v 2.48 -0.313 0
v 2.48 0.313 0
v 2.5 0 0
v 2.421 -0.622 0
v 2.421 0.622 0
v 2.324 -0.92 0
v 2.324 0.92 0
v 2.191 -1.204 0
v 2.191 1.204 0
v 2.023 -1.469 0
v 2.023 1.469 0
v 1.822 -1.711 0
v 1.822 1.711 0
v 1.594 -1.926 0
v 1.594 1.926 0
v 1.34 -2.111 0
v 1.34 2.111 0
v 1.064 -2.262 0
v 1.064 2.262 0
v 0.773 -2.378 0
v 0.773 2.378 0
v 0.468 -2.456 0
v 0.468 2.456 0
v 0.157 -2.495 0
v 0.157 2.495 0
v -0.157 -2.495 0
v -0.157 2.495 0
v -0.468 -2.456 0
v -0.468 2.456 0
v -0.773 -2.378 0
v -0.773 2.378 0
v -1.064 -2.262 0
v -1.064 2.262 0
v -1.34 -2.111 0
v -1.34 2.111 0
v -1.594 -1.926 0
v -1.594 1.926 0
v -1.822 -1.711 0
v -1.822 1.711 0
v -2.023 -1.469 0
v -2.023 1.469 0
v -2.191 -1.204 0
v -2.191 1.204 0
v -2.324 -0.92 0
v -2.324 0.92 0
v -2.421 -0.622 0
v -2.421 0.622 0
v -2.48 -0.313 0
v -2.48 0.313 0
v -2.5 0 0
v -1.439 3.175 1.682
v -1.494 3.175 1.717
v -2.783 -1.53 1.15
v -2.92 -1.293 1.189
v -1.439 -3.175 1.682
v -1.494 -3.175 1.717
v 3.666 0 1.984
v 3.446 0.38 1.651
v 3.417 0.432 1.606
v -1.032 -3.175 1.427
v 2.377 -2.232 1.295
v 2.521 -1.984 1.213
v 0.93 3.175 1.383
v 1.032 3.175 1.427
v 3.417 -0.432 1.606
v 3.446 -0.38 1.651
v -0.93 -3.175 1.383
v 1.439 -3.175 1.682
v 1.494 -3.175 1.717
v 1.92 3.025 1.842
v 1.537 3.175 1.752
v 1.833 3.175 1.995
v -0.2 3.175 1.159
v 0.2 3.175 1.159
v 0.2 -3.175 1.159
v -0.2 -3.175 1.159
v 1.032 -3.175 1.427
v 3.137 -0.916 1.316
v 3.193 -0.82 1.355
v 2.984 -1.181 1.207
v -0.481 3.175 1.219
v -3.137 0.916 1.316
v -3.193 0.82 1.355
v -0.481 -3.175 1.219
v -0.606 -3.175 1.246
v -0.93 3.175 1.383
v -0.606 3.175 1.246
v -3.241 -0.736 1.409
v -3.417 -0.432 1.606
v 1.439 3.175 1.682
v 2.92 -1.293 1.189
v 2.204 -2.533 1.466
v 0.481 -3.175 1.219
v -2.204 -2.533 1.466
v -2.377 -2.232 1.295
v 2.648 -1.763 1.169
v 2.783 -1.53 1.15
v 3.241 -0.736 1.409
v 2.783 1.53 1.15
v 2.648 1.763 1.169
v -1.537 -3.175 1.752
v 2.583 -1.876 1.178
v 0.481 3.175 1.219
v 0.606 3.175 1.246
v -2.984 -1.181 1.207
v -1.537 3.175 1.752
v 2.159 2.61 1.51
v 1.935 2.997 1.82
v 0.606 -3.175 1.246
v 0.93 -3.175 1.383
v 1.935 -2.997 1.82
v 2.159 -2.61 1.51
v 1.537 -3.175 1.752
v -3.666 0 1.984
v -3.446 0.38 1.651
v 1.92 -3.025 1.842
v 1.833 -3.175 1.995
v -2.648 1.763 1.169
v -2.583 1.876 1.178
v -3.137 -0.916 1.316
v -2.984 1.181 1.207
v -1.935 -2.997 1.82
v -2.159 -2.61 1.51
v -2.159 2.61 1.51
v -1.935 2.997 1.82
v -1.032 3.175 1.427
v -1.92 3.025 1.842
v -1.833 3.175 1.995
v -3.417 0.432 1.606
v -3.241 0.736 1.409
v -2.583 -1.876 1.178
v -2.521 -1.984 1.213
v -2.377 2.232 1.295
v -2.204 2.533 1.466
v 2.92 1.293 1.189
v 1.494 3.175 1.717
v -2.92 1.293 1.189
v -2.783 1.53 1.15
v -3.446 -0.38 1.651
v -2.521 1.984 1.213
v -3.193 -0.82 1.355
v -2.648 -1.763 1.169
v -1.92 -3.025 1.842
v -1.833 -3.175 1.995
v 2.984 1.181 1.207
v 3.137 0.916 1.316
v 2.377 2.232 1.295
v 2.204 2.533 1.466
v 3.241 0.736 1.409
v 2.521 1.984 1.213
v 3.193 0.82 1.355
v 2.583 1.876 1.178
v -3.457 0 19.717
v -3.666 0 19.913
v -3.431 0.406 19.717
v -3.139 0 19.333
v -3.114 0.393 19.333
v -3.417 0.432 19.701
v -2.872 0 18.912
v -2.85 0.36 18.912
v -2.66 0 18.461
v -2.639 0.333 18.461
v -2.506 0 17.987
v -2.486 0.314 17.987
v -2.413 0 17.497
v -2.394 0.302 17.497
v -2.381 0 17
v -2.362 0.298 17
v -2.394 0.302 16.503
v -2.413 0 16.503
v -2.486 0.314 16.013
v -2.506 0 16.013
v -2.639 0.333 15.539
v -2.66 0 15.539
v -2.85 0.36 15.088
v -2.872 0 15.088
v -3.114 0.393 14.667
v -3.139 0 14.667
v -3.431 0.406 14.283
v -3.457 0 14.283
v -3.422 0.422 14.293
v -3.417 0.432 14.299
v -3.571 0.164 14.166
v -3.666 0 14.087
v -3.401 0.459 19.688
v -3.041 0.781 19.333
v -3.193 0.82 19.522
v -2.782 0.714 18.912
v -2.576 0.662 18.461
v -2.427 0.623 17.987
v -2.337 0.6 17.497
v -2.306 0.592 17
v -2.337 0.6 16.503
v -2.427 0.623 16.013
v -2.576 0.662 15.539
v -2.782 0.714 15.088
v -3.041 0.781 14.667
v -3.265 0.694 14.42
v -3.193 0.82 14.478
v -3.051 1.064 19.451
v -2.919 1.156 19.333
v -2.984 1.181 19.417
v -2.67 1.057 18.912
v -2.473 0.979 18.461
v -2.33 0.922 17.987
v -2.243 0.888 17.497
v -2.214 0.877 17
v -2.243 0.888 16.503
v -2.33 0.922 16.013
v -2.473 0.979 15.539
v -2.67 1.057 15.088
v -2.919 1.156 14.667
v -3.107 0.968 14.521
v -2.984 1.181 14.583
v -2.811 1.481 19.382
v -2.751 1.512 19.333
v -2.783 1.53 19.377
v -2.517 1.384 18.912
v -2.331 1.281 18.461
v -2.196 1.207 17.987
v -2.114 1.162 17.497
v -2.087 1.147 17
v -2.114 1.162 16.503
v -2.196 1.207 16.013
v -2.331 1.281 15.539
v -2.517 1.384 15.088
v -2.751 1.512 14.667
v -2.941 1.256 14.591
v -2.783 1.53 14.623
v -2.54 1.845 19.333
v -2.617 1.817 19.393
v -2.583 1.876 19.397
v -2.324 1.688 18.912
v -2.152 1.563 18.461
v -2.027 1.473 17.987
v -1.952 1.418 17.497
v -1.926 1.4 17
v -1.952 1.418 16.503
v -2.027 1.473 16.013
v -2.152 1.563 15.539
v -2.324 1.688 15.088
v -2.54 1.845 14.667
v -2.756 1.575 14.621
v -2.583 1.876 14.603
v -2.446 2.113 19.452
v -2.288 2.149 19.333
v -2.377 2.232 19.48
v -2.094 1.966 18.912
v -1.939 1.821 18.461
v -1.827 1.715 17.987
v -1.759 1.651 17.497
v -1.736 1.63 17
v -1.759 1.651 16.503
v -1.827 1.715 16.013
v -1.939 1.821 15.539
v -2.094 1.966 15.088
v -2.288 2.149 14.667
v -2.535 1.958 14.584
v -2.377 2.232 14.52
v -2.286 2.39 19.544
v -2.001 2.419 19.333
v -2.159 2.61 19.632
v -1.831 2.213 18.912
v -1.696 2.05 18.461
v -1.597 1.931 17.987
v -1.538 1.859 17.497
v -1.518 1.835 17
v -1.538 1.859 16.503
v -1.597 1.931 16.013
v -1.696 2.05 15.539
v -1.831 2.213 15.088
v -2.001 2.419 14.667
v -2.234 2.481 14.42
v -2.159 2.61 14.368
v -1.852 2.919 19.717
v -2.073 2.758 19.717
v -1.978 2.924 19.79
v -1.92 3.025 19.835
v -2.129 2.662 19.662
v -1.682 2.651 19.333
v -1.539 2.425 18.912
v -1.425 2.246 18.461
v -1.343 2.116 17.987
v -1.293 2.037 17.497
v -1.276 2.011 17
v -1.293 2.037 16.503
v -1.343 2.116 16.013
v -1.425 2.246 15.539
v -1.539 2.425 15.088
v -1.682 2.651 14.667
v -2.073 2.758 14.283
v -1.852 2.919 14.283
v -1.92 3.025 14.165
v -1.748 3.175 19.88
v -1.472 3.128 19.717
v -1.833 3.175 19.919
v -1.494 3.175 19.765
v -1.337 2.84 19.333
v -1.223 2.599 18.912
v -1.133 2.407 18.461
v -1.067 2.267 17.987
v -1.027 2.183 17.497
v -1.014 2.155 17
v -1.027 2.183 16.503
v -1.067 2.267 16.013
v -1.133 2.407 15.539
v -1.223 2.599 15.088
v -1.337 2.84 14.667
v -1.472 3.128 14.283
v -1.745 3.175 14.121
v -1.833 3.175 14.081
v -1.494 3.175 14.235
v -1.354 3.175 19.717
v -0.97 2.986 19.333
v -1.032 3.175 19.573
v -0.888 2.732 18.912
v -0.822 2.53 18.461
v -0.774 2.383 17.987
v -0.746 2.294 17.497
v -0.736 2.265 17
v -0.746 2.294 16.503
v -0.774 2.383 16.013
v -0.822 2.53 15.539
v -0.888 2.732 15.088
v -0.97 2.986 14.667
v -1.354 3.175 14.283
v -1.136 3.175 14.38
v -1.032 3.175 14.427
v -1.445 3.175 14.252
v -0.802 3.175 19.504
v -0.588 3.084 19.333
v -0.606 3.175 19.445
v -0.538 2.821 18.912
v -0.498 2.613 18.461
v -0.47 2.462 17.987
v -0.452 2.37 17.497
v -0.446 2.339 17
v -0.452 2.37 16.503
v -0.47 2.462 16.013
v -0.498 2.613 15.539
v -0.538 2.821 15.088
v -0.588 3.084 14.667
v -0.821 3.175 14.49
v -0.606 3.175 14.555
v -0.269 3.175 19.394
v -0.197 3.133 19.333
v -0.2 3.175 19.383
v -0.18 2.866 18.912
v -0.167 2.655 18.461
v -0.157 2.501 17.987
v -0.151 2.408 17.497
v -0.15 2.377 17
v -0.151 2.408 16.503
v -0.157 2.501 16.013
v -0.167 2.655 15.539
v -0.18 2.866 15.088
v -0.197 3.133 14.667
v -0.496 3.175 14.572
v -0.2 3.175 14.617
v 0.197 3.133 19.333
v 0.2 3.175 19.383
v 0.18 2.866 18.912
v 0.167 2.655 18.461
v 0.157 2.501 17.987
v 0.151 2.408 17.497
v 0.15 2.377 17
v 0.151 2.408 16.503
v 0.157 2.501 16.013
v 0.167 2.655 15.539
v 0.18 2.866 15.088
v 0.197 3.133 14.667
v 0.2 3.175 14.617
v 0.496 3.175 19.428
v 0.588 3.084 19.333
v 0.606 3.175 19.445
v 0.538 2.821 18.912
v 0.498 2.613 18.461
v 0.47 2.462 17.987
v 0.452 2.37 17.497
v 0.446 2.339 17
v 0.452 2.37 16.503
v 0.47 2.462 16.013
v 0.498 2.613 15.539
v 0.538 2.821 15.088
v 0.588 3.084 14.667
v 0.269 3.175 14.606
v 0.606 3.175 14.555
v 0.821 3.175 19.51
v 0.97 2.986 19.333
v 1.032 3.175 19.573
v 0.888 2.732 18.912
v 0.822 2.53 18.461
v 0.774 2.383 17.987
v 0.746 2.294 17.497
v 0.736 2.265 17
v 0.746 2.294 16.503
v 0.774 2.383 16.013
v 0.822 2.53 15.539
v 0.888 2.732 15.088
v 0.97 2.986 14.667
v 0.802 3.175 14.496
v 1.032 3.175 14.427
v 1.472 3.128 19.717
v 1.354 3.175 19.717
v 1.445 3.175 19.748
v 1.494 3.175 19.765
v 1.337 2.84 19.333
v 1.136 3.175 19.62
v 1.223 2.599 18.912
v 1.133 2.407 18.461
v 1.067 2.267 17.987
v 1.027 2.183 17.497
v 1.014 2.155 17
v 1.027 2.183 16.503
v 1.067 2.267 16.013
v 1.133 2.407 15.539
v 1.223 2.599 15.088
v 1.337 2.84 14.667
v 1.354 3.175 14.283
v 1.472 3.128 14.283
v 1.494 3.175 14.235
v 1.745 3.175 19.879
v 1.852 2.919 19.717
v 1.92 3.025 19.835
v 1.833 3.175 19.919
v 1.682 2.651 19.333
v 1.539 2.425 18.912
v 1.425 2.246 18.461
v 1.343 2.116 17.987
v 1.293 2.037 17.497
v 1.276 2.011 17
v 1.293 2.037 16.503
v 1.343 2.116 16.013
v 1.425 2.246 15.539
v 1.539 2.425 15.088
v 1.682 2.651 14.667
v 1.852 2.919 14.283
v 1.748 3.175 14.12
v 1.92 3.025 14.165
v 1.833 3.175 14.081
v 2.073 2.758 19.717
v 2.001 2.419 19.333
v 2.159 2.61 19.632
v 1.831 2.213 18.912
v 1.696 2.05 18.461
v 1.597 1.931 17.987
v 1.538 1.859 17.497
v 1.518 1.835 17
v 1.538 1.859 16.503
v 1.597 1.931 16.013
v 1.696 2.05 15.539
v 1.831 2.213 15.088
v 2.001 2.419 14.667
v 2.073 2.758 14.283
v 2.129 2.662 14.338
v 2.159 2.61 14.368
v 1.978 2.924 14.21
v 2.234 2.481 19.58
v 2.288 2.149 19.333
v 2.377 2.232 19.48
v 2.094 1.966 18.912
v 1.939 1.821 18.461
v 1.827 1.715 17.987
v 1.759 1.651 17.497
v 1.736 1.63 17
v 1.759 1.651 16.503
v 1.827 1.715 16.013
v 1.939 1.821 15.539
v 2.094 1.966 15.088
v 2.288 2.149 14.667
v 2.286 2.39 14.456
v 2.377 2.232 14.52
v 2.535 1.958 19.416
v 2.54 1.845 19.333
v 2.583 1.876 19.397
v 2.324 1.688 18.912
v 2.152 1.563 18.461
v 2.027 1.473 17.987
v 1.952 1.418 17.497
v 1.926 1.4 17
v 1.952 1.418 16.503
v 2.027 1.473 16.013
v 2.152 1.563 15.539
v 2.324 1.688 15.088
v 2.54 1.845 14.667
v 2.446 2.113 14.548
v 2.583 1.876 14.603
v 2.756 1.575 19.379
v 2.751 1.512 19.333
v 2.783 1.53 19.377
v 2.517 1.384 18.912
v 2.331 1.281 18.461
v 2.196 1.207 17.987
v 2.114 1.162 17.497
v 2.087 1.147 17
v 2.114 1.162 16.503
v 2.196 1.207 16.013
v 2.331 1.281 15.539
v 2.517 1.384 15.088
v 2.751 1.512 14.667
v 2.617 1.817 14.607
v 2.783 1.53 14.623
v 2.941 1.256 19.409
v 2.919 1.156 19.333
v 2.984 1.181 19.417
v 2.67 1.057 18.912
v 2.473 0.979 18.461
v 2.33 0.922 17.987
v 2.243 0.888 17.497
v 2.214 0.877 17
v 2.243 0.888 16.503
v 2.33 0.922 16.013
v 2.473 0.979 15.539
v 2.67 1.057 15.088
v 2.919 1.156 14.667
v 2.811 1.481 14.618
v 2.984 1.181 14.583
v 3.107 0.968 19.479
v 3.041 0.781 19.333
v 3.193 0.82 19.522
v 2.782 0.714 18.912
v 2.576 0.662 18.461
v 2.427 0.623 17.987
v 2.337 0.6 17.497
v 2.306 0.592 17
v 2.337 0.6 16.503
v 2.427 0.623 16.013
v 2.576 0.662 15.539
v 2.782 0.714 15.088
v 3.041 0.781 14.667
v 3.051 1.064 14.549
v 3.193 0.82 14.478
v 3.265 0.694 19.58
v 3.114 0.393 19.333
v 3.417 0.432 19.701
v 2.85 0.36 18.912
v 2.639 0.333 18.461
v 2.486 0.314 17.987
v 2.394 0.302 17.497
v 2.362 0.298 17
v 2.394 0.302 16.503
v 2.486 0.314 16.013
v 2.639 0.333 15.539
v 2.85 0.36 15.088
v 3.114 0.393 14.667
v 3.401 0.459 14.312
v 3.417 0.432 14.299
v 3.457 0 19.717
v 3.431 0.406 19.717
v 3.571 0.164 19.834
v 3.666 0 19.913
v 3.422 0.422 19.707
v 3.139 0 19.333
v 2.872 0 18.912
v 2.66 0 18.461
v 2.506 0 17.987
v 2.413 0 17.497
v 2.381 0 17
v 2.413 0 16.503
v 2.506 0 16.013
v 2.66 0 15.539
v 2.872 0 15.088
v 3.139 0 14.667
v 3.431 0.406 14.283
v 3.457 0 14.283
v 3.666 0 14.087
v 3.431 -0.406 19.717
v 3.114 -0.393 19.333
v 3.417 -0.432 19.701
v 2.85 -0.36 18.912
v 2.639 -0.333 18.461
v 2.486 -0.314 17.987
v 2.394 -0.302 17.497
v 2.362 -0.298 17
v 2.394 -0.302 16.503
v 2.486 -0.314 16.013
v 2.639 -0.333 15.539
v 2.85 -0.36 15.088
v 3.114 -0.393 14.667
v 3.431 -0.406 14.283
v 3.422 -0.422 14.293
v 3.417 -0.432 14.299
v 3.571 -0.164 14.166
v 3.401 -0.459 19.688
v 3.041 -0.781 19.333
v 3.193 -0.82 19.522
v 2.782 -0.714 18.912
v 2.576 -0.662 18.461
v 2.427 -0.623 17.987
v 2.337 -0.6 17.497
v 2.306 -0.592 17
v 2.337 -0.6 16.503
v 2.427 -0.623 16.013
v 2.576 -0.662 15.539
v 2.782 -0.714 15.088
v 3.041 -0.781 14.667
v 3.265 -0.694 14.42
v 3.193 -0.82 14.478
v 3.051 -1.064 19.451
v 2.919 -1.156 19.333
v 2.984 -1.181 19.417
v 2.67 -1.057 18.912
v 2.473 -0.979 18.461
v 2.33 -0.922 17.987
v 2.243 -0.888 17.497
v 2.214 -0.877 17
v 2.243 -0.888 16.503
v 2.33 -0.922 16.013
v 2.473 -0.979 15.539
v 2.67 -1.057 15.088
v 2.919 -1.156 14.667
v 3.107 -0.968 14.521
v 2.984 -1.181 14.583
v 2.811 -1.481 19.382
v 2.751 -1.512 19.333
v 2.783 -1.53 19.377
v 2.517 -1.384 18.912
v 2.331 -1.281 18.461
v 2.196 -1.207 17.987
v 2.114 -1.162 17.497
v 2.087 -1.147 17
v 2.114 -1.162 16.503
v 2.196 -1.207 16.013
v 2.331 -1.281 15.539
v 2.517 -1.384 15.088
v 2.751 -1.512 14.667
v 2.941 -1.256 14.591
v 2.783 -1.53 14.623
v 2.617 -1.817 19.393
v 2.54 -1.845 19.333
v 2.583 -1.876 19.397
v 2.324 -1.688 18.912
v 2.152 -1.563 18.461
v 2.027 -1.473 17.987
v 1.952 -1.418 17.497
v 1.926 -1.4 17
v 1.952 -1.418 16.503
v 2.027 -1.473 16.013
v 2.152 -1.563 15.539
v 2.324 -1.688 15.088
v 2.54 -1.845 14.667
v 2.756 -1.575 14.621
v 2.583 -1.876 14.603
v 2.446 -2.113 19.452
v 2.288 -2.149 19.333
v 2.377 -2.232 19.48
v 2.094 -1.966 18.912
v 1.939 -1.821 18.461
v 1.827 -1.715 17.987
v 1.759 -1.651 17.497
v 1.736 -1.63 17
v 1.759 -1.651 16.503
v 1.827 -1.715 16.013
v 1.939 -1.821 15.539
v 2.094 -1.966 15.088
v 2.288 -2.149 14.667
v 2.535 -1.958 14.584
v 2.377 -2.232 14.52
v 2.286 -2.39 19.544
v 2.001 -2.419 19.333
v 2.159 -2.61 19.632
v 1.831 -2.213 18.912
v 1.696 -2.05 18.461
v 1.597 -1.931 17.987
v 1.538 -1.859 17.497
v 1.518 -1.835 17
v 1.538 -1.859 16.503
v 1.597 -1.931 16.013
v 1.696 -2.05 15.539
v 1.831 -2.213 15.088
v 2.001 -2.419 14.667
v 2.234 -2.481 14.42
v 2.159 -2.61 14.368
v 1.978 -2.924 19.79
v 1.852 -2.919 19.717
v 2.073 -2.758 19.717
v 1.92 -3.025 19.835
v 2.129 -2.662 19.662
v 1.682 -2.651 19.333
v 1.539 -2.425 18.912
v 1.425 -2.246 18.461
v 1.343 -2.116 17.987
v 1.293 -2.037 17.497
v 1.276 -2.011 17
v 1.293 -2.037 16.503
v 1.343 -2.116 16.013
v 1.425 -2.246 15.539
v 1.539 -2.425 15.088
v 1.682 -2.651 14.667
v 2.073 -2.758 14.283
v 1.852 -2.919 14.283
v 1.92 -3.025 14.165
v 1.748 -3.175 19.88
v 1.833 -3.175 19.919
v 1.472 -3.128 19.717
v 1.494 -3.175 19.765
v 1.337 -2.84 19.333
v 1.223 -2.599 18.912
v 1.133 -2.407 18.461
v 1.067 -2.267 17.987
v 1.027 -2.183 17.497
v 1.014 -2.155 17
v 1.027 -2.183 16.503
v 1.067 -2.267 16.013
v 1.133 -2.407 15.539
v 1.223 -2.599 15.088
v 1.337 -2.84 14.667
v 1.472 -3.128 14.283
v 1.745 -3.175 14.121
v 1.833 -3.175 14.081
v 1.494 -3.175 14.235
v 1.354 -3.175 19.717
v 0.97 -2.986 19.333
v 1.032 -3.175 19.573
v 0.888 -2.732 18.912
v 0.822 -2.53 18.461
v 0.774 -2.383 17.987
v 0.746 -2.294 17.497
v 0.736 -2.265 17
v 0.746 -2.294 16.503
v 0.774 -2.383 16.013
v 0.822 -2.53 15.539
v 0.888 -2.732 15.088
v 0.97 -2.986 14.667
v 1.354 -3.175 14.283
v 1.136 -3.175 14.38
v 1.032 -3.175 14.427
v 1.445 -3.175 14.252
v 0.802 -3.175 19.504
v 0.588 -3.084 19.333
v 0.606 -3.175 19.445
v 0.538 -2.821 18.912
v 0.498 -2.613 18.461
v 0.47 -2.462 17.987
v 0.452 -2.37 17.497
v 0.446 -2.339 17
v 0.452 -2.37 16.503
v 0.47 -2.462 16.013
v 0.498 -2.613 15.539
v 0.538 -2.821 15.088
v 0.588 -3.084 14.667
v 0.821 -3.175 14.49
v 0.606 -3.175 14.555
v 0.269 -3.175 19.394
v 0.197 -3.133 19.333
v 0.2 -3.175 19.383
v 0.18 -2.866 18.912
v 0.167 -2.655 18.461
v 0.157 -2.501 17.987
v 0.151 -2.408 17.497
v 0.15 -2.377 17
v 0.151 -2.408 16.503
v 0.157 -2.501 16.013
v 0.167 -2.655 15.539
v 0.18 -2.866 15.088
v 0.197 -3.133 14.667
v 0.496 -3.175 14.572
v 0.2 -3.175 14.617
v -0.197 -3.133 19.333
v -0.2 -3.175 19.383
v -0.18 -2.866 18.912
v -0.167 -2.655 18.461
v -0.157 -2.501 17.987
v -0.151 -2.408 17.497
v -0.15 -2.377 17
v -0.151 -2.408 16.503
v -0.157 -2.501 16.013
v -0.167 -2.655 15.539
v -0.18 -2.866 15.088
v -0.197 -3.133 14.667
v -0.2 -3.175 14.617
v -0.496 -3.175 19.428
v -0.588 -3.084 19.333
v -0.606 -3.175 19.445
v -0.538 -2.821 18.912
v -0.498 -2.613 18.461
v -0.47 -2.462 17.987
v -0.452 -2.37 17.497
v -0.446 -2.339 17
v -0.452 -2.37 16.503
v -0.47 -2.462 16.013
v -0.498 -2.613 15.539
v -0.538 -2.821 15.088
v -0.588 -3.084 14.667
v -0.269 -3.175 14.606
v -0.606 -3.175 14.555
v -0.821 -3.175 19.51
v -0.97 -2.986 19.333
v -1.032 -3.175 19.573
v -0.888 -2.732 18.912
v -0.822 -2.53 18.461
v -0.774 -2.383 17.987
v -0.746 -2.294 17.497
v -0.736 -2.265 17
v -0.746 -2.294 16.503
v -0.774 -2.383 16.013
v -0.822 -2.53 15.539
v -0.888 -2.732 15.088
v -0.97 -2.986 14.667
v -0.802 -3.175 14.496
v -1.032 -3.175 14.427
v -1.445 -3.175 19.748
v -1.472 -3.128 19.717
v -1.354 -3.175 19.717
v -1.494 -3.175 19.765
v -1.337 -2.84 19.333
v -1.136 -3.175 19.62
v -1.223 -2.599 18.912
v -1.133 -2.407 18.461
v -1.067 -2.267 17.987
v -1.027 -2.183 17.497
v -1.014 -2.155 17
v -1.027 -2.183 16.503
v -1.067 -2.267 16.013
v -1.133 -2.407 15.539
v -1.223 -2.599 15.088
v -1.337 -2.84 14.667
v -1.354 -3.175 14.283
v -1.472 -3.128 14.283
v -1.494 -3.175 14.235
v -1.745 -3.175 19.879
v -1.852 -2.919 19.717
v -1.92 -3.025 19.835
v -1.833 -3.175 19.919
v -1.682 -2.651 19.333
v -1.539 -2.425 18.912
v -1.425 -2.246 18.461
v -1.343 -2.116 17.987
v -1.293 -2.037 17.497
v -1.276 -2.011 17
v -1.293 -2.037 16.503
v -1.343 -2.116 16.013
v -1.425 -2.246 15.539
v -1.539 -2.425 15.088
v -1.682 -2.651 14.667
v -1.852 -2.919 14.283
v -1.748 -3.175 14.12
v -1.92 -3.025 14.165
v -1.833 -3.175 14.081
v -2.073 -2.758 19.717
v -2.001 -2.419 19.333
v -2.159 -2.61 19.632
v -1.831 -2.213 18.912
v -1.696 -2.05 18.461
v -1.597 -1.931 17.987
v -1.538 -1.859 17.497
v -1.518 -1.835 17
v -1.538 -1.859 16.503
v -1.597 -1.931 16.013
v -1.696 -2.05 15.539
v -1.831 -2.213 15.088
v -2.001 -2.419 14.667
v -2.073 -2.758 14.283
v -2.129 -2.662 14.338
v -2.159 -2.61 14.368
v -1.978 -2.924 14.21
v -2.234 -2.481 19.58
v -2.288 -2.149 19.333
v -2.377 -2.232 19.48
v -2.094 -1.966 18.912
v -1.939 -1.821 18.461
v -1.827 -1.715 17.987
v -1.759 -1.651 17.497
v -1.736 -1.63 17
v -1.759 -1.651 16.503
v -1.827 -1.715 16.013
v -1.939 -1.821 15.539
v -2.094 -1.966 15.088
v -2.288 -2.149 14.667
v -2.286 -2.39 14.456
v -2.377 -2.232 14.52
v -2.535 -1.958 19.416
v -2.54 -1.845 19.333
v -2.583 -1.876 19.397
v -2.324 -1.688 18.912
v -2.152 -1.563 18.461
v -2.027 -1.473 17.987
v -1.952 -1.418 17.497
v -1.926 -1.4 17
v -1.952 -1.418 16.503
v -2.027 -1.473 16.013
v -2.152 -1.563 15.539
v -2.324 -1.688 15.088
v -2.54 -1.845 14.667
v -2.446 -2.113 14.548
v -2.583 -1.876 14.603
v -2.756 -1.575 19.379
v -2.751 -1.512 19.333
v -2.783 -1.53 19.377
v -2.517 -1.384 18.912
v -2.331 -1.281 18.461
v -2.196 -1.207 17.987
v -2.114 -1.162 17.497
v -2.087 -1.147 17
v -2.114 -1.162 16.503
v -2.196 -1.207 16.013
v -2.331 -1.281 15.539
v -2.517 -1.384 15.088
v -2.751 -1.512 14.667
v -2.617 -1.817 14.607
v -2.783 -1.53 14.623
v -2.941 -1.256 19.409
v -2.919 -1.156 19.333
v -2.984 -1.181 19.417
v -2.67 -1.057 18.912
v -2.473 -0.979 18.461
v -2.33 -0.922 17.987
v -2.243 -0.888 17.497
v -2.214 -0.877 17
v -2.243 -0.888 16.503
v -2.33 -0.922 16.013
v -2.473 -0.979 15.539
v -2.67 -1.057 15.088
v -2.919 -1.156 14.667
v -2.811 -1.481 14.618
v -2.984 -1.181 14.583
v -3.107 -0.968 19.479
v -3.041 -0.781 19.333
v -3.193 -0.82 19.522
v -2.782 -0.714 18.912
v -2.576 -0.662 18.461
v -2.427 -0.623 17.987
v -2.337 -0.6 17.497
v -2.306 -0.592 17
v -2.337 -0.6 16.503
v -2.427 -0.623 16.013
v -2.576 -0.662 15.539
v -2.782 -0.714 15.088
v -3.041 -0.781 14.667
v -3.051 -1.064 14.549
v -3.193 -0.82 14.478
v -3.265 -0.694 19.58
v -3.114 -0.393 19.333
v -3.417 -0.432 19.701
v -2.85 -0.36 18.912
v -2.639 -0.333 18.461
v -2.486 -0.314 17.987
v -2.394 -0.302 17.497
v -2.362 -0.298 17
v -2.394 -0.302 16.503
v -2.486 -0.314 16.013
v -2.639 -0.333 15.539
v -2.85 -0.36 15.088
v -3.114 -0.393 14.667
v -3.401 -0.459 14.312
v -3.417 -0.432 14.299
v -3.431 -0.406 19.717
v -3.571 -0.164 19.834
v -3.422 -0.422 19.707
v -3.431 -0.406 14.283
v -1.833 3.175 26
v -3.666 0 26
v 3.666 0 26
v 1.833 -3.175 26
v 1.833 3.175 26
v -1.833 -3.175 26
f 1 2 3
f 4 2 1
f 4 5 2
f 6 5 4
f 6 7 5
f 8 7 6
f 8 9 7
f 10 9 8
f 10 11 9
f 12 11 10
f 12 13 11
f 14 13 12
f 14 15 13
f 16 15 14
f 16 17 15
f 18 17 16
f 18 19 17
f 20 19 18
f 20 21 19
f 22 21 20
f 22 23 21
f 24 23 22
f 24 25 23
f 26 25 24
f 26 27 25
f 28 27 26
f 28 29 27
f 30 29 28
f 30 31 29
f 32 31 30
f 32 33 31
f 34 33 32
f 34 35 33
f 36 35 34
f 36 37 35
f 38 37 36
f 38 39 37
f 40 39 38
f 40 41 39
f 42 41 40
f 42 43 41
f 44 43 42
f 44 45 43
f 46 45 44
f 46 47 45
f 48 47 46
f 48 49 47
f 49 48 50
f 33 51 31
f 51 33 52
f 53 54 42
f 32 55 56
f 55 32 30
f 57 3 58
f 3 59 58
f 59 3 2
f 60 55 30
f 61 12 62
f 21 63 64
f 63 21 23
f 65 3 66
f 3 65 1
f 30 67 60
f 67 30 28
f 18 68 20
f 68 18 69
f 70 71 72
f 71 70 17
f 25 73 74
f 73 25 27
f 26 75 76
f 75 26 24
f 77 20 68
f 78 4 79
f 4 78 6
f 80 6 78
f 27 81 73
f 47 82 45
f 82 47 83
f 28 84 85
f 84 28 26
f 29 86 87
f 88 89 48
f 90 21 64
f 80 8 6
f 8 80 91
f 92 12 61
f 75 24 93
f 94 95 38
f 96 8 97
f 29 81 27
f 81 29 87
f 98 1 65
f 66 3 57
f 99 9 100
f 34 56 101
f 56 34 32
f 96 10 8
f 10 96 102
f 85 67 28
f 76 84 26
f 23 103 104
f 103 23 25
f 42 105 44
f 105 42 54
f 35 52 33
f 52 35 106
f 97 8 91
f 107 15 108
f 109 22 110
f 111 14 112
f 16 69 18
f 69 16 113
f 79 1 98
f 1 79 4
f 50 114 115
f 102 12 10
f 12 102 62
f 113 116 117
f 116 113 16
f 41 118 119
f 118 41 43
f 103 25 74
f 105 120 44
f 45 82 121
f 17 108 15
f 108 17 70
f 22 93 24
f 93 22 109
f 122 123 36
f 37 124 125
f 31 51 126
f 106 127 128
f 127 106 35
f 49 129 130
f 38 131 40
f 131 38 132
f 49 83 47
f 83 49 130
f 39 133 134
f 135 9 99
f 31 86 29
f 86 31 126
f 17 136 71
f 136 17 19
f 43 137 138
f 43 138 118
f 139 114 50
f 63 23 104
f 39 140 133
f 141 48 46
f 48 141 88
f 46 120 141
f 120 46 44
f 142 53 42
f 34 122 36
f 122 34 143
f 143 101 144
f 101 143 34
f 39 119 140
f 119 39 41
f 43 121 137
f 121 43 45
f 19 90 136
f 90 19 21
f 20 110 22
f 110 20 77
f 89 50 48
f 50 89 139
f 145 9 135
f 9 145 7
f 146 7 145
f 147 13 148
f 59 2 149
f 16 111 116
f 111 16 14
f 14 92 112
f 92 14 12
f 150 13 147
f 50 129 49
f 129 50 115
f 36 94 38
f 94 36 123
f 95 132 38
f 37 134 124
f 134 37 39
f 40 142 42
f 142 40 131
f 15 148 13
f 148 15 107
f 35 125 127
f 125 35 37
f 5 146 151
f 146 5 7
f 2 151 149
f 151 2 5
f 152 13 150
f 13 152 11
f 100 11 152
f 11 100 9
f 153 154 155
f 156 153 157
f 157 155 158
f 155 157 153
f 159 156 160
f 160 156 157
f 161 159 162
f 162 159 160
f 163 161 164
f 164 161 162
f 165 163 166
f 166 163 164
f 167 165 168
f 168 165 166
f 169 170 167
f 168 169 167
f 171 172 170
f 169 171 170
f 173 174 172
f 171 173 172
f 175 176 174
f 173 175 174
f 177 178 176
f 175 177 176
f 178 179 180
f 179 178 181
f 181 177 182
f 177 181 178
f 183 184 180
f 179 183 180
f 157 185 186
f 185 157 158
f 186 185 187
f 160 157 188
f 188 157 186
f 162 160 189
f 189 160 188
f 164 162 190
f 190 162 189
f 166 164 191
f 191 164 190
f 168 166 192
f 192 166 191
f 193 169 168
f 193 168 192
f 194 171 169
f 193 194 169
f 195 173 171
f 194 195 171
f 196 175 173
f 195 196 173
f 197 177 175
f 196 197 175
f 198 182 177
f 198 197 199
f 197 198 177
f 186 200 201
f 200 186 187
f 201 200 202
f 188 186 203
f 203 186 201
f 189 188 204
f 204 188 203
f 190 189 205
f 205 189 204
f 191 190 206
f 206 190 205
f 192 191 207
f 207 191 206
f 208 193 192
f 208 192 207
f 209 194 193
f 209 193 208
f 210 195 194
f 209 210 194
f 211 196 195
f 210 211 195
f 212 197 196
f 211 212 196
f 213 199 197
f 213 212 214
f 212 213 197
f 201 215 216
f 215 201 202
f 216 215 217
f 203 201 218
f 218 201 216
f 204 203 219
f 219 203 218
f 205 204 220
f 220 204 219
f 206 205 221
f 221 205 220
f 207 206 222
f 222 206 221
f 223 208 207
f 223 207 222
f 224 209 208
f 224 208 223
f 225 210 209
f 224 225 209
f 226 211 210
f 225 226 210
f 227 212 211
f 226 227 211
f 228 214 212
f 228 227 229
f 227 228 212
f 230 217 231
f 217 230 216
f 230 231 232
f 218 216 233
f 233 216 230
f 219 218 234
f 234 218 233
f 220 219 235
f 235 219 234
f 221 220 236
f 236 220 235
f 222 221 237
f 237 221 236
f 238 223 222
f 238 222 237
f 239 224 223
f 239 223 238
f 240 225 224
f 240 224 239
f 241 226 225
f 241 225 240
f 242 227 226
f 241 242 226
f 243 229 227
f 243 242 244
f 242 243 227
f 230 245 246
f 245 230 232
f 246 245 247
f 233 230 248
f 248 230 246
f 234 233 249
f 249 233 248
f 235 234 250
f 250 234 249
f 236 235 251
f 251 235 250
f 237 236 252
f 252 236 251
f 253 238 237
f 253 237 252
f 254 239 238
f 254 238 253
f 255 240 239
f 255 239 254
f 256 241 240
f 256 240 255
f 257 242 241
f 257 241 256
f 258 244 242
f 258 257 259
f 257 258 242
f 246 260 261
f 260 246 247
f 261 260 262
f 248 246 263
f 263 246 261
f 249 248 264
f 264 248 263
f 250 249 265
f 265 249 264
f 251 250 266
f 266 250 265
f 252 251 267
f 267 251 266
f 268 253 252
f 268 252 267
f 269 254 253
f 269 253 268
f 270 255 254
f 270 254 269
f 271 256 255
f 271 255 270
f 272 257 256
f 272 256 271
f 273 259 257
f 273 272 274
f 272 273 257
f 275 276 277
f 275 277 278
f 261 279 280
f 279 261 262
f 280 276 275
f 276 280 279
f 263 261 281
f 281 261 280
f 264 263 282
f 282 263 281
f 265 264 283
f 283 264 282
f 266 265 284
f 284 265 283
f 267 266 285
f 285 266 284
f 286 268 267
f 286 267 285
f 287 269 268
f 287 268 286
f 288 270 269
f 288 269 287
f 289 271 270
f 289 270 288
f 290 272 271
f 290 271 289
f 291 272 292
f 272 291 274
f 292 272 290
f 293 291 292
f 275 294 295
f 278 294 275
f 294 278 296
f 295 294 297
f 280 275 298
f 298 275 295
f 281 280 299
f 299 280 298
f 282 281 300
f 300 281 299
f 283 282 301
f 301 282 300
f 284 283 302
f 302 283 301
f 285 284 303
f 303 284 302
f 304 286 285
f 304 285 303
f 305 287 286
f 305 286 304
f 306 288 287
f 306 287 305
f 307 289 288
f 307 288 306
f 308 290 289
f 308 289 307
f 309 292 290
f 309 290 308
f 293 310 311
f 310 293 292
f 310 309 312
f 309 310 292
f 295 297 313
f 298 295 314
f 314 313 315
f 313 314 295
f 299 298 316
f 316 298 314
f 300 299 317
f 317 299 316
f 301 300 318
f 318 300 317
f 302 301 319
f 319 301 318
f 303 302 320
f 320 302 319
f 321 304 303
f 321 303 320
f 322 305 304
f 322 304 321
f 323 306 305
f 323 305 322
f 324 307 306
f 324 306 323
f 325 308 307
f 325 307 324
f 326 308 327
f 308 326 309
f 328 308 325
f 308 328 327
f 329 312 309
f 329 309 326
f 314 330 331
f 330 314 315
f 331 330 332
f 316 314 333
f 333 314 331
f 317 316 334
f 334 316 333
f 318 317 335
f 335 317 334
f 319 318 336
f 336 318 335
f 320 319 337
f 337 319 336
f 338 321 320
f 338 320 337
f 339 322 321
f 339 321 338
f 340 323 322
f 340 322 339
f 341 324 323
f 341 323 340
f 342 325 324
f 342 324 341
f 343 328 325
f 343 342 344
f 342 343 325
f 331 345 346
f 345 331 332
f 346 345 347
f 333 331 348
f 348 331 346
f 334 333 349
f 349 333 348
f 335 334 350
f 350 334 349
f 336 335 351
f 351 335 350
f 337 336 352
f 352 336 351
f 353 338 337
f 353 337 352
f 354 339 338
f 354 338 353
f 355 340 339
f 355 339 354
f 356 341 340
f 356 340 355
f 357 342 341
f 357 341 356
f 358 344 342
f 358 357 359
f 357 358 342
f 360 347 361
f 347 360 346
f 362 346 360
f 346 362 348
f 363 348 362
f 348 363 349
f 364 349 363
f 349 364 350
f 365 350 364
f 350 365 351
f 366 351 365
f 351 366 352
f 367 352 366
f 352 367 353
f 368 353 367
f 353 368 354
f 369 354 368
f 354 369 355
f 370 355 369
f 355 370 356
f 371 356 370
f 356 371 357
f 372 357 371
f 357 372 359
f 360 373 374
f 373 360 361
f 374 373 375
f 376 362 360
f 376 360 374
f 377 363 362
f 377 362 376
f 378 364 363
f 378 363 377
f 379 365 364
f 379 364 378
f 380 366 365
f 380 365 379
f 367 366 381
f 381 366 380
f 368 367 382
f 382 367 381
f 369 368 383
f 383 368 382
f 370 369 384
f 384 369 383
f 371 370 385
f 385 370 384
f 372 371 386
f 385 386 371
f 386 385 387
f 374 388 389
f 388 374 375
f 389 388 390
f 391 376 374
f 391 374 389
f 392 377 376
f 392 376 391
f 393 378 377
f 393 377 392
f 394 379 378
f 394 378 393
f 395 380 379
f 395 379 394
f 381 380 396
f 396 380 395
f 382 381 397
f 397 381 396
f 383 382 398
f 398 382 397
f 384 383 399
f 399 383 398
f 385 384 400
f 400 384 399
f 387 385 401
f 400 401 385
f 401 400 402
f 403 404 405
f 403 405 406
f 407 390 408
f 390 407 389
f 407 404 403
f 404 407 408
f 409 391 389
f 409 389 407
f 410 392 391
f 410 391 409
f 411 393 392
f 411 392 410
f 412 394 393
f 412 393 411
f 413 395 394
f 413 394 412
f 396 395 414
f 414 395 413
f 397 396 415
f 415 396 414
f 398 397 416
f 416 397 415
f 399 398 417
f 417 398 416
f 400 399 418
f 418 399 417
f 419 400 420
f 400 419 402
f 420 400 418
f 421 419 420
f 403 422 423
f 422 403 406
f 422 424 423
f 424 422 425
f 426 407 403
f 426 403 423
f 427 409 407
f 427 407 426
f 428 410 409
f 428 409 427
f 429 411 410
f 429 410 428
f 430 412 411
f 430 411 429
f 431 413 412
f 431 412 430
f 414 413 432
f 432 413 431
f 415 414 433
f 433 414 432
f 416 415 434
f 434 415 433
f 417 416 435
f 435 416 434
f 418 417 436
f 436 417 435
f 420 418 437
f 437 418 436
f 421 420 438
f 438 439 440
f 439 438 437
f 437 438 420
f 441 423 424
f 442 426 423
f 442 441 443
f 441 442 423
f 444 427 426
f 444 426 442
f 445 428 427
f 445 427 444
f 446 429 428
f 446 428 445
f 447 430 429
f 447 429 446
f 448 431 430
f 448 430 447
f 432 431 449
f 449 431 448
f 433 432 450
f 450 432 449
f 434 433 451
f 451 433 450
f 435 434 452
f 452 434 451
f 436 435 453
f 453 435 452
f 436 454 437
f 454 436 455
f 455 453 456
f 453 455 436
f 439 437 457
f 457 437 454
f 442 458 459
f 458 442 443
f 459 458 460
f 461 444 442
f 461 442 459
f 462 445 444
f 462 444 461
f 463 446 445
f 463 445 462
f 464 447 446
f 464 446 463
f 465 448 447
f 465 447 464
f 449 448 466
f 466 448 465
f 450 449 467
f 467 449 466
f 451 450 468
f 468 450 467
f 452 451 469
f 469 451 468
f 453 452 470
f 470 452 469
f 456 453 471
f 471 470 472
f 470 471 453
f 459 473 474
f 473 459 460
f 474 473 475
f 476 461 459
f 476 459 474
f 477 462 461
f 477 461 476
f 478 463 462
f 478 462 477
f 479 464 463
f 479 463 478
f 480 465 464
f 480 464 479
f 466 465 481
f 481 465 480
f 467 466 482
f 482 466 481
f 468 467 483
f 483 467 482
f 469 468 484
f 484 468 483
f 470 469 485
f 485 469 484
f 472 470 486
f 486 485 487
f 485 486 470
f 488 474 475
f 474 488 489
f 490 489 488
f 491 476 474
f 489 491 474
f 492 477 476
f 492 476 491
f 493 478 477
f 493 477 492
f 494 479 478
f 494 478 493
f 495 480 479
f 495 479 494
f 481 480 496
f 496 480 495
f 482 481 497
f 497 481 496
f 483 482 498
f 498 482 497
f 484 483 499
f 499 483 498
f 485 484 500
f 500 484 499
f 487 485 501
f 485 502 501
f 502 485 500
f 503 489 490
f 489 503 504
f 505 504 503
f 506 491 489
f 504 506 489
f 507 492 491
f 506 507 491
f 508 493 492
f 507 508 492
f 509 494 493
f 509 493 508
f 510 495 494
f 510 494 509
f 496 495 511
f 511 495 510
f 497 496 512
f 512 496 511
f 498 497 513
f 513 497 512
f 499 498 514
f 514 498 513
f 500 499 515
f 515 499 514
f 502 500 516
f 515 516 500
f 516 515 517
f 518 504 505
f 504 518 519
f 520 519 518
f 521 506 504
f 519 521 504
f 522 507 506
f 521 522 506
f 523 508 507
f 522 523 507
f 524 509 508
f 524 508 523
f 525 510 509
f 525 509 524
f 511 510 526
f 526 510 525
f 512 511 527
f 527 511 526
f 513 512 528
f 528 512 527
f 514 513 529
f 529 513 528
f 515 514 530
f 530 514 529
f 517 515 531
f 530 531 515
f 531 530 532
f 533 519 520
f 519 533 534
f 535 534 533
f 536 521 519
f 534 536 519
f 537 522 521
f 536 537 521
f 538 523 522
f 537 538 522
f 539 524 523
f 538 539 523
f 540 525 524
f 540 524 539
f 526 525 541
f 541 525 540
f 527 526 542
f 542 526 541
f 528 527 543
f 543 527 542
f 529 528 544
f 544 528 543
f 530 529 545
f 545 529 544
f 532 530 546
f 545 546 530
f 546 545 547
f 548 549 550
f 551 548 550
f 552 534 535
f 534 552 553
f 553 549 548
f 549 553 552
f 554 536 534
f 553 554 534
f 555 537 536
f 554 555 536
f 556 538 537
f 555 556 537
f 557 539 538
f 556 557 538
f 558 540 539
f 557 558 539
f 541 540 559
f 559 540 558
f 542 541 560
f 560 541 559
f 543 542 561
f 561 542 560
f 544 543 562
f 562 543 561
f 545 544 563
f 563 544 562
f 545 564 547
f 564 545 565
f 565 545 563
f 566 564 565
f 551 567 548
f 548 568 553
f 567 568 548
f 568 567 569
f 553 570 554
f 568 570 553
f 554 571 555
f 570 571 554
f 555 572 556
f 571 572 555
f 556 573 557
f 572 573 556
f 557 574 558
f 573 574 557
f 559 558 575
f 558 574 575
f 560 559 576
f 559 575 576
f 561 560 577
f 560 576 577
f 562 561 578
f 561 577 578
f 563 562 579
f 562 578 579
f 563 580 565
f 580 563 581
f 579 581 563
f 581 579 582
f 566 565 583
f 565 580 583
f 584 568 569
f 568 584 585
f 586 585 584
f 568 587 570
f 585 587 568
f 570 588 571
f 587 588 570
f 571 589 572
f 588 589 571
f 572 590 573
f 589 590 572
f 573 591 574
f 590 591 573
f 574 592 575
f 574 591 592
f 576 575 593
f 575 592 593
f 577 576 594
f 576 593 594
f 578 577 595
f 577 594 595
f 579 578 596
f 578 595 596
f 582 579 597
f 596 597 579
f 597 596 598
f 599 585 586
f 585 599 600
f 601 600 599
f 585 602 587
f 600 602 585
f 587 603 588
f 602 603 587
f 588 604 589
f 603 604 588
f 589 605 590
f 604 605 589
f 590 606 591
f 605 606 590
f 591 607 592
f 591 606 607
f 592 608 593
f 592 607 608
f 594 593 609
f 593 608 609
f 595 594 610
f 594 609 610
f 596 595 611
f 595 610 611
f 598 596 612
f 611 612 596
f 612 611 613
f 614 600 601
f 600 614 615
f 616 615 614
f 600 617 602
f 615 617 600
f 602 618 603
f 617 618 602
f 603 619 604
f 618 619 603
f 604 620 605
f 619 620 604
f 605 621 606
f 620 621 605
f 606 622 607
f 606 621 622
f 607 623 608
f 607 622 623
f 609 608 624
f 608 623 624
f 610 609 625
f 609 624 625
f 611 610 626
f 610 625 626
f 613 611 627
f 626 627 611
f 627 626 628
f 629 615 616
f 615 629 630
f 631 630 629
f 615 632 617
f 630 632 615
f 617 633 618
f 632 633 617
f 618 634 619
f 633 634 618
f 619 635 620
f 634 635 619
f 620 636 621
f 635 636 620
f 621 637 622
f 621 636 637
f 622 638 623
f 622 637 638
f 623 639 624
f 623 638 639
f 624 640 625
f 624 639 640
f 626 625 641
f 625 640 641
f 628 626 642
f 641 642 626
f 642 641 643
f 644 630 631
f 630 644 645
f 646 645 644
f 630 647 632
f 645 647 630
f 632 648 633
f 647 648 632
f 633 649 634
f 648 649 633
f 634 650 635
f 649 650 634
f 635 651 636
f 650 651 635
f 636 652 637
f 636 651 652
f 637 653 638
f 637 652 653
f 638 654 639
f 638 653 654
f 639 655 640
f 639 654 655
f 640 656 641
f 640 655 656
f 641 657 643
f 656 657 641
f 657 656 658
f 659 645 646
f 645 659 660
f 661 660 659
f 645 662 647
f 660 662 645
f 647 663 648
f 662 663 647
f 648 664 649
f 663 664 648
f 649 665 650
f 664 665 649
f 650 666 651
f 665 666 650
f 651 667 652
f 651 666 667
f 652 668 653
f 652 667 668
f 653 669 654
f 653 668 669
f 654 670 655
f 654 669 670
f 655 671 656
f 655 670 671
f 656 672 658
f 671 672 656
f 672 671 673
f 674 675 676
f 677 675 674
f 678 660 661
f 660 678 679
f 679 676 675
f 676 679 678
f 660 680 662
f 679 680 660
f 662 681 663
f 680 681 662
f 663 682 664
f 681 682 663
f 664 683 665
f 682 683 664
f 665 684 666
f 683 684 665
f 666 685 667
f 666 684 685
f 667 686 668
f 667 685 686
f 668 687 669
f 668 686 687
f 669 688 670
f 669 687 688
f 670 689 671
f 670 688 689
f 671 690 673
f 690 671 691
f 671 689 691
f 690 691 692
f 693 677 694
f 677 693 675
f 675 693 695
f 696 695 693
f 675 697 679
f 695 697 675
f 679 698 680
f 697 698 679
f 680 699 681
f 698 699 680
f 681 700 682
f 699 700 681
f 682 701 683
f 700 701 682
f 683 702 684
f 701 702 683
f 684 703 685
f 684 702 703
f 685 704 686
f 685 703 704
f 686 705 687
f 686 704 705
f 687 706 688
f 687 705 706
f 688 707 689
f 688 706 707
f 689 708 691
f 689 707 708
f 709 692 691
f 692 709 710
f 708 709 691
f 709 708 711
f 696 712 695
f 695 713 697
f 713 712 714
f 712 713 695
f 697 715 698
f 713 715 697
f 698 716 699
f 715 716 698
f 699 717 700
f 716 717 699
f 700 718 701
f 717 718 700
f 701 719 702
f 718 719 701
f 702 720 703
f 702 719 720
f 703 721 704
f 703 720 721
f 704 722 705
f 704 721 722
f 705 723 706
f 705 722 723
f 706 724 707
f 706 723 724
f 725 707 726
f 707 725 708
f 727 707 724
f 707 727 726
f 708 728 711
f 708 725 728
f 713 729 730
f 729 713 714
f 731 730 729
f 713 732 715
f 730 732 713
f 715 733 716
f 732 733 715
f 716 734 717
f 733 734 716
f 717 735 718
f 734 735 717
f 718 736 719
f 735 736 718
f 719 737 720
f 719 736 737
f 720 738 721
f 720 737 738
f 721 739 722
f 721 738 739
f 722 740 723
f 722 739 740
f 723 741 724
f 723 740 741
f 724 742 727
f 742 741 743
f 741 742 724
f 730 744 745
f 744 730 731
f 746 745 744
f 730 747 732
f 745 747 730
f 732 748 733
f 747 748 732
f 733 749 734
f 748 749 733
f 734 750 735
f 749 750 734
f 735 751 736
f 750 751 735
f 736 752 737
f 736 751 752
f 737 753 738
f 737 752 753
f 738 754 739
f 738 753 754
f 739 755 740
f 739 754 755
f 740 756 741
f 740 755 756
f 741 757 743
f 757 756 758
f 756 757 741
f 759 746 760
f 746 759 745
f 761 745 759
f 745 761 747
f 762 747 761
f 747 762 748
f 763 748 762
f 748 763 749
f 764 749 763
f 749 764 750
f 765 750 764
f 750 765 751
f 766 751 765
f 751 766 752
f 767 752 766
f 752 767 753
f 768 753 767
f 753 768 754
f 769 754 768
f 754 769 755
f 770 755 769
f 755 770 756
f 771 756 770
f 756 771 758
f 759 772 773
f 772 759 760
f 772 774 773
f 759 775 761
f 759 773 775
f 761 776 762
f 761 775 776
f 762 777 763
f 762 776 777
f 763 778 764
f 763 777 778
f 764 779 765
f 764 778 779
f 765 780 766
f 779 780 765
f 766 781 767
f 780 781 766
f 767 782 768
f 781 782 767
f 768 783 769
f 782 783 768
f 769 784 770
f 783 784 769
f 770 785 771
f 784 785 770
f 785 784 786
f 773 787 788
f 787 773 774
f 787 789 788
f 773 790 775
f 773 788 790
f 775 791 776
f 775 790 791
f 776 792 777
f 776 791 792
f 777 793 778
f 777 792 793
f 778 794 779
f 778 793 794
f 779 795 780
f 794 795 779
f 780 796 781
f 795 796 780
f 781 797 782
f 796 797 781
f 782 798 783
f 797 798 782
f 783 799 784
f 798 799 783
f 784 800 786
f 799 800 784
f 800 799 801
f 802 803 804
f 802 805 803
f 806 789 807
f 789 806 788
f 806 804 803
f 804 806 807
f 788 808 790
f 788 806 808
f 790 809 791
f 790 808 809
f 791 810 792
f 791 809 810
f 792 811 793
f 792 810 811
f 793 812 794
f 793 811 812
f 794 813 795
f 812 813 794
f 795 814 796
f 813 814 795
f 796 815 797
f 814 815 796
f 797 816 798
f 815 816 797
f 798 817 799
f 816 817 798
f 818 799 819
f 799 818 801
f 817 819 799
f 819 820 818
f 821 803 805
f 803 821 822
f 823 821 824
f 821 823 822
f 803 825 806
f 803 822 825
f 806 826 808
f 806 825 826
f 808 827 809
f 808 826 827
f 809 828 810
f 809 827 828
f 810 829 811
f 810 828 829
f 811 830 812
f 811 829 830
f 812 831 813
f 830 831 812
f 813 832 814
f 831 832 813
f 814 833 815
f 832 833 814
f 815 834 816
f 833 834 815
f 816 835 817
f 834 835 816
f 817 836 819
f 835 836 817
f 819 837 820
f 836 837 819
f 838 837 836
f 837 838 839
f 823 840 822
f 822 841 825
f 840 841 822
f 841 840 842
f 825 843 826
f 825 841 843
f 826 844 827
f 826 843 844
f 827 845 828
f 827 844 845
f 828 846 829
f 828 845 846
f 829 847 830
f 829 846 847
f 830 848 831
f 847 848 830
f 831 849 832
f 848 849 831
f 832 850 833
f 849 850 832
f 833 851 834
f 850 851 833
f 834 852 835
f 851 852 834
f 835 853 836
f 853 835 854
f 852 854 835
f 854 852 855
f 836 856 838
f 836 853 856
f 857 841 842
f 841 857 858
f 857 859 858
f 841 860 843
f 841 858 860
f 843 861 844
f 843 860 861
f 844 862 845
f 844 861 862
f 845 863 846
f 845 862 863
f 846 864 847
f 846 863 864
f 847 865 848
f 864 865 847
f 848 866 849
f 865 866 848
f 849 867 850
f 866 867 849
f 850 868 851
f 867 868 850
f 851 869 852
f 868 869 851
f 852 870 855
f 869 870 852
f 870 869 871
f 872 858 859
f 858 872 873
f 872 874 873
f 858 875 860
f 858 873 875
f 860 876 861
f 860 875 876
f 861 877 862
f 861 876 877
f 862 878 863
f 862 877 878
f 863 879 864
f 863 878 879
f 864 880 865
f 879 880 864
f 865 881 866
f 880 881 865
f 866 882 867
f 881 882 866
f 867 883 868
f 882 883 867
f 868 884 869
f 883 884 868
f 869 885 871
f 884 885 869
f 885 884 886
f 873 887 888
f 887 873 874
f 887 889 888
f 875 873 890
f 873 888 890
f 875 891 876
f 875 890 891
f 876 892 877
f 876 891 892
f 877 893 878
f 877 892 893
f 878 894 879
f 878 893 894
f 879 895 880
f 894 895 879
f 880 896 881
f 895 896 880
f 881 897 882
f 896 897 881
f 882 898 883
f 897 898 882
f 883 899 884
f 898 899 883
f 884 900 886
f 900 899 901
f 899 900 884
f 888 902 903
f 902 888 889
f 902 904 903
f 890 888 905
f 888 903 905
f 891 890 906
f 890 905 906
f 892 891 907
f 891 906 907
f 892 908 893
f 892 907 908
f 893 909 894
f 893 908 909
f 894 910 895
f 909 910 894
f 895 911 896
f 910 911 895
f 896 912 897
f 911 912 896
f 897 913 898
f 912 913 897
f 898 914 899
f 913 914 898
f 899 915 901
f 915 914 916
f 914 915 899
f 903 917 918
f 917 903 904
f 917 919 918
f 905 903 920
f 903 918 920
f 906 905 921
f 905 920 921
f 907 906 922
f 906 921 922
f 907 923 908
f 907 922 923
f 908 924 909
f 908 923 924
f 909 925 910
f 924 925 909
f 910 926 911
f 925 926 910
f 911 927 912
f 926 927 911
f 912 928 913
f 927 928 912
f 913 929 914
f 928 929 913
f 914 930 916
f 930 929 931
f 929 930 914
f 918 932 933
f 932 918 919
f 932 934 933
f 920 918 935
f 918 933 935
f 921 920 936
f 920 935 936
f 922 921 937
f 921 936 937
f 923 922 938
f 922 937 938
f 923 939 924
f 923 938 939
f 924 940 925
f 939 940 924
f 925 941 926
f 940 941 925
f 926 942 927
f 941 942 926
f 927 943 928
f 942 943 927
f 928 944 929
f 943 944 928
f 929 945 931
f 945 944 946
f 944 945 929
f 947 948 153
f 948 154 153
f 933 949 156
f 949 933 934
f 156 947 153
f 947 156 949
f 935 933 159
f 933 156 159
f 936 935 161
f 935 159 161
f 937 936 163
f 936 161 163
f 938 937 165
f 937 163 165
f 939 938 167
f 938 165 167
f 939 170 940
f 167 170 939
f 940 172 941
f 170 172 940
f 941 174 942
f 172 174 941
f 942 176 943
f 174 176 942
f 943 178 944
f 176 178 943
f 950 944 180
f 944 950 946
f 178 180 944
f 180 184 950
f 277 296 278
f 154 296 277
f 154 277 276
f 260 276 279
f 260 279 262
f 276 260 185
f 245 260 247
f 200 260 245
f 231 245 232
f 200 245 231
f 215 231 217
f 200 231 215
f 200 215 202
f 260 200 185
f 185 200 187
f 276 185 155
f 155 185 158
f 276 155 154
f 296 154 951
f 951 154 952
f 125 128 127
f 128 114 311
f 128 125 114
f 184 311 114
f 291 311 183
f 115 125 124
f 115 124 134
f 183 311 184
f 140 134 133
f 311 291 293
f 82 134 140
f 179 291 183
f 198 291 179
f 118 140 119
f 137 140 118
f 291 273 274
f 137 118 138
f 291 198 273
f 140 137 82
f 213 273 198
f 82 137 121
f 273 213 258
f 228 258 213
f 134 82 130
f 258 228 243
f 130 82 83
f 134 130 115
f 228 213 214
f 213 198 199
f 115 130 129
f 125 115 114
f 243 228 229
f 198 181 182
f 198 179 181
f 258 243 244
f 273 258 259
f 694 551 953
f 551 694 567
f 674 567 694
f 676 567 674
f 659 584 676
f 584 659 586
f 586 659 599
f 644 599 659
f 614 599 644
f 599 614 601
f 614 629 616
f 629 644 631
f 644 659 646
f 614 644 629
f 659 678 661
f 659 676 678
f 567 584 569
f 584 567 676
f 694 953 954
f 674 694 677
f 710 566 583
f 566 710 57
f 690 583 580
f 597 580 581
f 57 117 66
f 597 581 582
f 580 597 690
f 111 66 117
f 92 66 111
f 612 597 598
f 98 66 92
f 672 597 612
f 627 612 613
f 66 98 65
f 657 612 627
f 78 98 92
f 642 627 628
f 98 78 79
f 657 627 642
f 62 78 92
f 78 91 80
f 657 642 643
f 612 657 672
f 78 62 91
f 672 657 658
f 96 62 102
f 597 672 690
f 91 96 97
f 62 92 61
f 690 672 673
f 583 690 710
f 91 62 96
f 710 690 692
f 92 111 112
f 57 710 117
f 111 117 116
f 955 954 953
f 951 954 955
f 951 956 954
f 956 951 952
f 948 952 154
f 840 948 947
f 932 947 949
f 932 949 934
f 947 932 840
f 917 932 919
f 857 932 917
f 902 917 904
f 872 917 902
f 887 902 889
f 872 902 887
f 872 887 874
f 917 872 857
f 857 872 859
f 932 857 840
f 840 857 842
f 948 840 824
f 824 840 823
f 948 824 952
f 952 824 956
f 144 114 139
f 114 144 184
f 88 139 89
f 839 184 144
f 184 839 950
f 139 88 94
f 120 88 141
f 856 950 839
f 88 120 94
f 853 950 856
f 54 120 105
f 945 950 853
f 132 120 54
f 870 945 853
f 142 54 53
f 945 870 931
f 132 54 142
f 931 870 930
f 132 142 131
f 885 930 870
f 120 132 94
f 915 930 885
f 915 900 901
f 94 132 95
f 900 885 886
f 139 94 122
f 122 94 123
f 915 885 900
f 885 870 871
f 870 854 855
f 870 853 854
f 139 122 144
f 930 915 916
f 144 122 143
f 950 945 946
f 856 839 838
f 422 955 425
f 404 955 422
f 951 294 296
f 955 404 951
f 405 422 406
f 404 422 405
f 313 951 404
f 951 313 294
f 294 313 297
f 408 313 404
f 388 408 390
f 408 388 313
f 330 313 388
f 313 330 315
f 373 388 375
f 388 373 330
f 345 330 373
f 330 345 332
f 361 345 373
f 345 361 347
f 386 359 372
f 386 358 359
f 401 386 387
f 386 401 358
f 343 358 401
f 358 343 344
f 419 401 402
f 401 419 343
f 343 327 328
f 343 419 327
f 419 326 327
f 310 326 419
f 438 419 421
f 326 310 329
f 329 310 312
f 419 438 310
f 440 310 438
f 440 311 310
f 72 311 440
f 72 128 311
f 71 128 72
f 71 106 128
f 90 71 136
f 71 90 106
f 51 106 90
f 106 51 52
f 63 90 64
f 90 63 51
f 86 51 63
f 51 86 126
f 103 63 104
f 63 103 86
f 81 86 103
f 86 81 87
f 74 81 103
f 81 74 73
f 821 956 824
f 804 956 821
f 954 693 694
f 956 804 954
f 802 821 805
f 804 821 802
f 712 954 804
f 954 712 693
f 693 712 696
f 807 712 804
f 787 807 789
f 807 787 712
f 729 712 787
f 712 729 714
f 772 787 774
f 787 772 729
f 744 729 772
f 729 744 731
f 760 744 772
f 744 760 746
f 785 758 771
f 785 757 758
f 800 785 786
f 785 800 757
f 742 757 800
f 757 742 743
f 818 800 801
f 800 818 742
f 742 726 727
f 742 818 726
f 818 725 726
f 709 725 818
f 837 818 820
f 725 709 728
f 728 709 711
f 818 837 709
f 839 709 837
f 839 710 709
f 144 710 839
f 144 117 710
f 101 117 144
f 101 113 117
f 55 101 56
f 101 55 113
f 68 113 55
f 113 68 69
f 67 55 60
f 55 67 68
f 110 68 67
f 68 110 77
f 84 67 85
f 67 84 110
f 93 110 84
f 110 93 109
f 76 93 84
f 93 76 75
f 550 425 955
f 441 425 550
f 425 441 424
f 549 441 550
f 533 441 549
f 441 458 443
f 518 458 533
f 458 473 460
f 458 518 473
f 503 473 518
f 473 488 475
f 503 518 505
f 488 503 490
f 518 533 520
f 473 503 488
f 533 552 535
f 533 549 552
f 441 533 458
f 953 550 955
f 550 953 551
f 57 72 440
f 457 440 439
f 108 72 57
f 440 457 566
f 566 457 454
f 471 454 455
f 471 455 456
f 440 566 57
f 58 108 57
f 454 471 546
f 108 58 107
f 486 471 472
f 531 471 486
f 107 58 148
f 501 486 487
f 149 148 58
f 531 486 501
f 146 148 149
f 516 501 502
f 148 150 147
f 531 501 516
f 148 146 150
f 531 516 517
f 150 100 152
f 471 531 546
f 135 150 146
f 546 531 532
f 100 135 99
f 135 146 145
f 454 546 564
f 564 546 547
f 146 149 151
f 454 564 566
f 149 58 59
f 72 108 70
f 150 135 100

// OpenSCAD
$fn = 50;


difference() {
	union() {
		translate(v = [0, 0, 0]) {
			rotate(a = [0, 0, 0]) {
				difference() {
					union() {
						linear_extrude(height = 26) {
							polygon(points = [[3.6658550000, 0.0000000000], [1.8329275000, 3.1747235566], [-1.8329275000, 3.1747235566], [-3.6658550000, 0.0000000000], [-1.8329275000, -3.1747235566], [1.8329275000, -3.1747235566]]);
						}
					}
					union() {
						translate(v = [0, 0, 17]) {
							rotate_extrude(angle = 360) {
								translate(v = [6.3500000000, 0, 0]) {
									circle(r = 3.9687500000);
								}
							}
						}
						difference() {
							cylinder(h = 2, r1 = 10.5000000000, r2 = 11.6750000000);
							cylinder(h = 2, r1 = 2.5000000000, r2 = 3.6750000000);
						}
					}
				}
			}
		}
	}
	union();
}
